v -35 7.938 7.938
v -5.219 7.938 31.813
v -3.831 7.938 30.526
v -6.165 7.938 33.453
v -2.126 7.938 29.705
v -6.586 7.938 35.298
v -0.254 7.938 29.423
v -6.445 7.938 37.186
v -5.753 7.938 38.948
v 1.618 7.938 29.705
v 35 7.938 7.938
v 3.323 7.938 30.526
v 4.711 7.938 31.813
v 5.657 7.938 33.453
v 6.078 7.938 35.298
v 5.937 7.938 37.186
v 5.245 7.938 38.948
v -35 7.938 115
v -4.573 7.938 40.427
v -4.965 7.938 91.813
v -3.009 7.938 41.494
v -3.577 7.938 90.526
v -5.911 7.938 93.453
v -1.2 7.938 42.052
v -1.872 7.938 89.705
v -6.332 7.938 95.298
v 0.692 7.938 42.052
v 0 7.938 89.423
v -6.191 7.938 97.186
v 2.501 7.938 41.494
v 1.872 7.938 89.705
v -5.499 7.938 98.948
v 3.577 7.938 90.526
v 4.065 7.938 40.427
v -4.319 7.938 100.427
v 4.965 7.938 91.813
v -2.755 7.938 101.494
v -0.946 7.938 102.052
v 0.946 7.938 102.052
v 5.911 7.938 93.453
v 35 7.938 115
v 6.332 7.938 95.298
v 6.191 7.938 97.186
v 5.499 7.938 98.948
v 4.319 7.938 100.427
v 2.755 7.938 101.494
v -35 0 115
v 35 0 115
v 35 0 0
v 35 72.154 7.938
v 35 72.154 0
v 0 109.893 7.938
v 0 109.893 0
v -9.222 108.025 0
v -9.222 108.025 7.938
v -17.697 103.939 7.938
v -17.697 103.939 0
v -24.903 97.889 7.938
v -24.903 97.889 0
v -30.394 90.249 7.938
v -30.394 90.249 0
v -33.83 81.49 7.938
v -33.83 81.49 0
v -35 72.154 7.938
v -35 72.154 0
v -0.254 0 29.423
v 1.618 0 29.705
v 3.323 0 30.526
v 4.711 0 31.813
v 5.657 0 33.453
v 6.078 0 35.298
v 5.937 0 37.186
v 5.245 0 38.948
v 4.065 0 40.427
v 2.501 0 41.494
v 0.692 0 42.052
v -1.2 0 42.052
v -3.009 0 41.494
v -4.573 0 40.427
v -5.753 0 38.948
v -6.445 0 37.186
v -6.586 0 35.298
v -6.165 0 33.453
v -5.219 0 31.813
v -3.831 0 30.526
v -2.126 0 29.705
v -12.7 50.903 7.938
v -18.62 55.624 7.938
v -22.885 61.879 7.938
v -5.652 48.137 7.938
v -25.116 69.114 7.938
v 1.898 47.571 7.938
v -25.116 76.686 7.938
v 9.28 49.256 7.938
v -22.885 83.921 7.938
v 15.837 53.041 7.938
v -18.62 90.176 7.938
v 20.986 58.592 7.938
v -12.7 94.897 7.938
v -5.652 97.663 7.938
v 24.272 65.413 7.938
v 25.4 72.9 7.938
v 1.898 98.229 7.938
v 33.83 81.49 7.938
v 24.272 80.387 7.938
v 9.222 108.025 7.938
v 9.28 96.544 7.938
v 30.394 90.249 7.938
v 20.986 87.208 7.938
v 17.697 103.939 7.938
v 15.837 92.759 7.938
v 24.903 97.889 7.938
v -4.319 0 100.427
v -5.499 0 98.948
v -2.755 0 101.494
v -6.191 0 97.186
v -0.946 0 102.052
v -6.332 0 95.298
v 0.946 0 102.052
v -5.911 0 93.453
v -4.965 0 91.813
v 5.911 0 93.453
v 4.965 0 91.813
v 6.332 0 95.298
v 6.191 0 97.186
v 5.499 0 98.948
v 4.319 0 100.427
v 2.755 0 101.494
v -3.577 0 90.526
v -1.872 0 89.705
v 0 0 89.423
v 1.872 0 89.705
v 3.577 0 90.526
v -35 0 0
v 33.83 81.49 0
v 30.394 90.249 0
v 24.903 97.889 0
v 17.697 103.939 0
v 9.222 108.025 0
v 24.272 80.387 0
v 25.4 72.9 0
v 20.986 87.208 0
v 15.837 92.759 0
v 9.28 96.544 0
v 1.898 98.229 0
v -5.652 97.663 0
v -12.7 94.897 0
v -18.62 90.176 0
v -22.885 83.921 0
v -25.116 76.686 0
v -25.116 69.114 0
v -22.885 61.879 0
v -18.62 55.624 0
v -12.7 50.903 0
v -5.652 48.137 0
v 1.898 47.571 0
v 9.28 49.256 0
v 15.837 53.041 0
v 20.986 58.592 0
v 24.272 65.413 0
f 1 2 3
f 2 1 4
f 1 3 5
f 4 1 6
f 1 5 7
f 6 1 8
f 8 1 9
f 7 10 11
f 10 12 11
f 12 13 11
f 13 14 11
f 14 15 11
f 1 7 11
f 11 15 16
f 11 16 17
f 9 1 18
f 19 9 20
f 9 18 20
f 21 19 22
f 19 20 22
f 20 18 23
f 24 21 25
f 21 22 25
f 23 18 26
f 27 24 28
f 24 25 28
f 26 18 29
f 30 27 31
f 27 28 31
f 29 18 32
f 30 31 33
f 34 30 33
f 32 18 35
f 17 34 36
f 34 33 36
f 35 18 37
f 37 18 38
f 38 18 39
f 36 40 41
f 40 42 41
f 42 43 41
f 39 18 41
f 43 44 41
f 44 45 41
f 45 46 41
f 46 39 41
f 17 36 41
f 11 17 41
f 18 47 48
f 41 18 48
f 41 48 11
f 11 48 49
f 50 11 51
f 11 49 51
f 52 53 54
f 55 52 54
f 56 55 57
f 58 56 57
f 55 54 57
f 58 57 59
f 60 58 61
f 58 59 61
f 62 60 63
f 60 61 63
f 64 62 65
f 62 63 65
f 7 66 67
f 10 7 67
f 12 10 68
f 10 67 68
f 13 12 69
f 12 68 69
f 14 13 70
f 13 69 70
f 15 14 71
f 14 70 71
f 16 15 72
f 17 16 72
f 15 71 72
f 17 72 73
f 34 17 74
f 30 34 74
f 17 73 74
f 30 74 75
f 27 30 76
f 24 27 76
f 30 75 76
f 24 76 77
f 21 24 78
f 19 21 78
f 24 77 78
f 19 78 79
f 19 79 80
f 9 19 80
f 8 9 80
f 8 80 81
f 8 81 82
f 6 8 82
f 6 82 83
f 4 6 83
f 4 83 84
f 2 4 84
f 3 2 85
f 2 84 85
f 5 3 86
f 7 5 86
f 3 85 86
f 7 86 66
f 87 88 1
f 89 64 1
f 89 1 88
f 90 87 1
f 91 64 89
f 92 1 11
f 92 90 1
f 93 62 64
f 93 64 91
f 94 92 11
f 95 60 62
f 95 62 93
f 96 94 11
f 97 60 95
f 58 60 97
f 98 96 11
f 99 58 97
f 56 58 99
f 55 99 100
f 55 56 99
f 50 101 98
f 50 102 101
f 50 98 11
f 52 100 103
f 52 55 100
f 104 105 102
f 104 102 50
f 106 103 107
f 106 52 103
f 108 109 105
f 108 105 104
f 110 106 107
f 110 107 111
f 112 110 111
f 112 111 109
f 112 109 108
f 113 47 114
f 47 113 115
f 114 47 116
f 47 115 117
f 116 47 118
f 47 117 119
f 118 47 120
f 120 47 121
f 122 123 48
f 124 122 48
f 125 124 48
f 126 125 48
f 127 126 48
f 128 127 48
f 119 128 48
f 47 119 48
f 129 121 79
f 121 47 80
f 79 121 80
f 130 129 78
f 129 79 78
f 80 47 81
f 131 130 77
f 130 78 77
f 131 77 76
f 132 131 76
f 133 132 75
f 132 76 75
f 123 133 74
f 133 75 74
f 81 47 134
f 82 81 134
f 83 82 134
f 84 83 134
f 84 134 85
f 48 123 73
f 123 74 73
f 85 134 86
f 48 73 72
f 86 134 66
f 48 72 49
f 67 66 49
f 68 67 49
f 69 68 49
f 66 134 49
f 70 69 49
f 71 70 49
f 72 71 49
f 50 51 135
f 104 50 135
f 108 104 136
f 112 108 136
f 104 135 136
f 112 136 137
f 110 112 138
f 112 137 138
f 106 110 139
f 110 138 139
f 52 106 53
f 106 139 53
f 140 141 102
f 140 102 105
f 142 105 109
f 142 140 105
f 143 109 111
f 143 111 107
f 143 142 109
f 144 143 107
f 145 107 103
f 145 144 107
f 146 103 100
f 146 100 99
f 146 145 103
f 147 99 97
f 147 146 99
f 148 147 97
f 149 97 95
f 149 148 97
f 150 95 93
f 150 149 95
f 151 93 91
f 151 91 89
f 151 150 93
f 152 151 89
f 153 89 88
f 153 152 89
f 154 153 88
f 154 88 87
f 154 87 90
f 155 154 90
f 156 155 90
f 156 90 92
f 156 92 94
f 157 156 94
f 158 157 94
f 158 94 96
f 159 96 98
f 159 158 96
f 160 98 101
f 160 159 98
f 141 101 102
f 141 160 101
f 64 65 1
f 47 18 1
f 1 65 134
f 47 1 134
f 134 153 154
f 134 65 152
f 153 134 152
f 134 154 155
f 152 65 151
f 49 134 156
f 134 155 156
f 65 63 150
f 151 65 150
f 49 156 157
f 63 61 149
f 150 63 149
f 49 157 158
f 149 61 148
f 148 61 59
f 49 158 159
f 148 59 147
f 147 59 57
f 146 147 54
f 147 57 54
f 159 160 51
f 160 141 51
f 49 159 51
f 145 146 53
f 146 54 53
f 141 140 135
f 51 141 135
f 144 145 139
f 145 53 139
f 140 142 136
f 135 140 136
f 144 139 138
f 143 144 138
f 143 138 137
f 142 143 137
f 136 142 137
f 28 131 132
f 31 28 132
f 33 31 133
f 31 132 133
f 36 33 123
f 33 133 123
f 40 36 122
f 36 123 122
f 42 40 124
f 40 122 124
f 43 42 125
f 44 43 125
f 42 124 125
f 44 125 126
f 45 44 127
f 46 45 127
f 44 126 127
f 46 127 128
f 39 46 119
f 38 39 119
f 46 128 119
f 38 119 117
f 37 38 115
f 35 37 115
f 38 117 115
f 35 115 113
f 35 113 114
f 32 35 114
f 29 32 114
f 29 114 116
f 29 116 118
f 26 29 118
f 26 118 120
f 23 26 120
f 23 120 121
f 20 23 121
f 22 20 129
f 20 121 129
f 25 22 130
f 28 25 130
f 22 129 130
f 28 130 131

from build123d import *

# Parameters (mm, degrees)
CROQUIS1_R              = 25.4
SALIENTE_EXTRUIR1_DEPTH = 7.9375
CROQUIS2_W              = 70
CROQUIS2_H              = 115
CROQUIS2_R              = 6.35
SALIENTE_EXTRUIR2_DEPTH = 7.9375


with BuildPart() as part:
    # Croquis1 → Saliente-Extruir1 (new body)
    with BuildSketch(Plane.XY):
        with BuildLine():
            Line((-35, 72.154), (-35, 0))
            Line((-35, 0), (35, 0))
            Line((35, 0), (35, 72.154))
            ThreePointArc((35, 72.154), (24.903139014, 97.889287059), (0, 109.89283941))
            ThreePointArc((0, 109.89283941), (-24.903139014, 97.889287059), (-35, 72.154))
        make_face()
        with Locations((0, 72.9)):
            Circle(CROQUIS1_R, mode=Mode.SUBTRACT)
    extrude(amount=SALIENTE_EXTRUIR1_DEPTH)

    # Croquis2 → Saliente-Extruir2 (add)
    with BuildSketch(Plane.XZ):
        with Locations((0, 57.5)):
            Rectangle(CROQUIS2_W, CROQUIS2_H)
        with Locations(Location((-0.254, 35.772581169, 0), (0, 0, 270))):
            Circle(CROQUIS2_R, mode=Mode.SUBTRACT)
        with Locations(Location((0, 95.772581169, 0), (0, 0, 270))):
            Circle(CROQUIS2_R, mode=Mode.SUBTRACT)
    extrude(amount=-SALIENTE_EXTRUIR2_DEPTH)


solid = part.part
